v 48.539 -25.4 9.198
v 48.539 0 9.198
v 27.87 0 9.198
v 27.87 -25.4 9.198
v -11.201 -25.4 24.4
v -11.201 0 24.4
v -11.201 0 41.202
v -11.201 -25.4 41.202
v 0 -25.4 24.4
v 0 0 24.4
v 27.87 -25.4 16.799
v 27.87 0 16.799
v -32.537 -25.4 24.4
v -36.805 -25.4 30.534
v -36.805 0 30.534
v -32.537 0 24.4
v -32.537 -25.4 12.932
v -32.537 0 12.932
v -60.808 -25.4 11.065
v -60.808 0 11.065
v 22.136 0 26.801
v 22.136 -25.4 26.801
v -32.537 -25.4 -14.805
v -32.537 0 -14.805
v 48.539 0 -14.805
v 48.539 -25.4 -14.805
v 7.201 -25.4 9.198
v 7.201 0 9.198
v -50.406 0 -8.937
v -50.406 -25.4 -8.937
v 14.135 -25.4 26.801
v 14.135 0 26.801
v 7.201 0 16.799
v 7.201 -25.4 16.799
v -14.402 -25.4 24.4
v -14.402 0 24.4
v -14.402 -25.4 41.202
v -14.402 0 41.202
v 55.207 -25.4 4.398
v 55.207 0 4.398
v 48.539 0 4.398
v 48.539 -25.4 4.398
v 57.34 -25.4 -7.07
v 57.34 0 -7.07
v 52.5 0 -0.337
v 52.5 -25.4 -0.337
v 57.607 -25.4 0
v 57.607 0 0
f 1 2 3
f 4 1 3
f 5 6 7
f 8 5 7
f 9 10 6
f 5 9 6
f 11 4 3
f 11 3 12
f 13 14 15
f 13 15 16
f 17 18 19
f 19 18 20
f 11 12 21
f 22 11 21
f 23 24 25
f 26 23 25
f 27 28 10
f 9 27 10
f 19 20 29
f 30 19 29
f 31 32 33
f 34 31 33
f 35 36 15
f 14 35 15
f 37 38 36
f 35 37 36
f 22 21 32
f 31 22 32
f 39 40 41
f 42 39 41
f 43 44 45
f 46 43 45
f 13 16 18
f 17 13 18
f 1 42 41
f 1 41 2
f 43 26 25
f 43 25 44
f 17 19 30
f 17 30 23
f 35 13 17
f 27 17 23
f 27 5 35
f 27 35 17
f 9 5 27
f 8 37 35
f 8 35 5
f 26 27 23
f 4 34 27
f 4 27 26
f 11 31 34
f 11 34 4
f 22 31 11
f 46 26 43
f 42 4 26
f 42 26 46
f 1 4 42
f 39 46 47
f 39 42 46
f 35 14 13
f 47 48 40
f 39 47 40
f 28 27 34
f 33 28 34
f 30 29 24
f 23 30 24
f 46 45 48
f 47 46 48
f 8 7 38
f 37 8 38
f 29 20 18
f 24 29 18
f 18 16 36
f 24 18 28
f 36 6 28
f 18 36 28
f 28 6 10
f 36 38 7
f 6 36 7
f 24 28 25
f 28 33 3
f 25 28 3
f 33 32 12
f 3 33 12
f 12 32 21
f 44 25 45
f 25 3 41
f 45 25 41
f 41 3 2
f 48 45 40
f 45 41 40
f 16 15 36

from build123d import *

# Parameters (mm, degrees)
F0_W     = 20.66925
F0_H     = 7.60095
F1_DEPTH = 25.4


with BuildPart() as f1:
    # F0 (on Front) → F1 (new body)
    with BuildSketch(Plane.XZ):
        Polygon((-32.537401, 12.932173), (-60.807601, 11.065273), (-50.4063, -8.937228), (-32.537401, -14.804627), (17.0688, -14.804627), (48.5394, -14.804627), (48.5394, 4.397773), (48.5394, 9.198373), (27.87015, 9.198373), (7.2009, 9.198373), (0, 24.400273), (-11.2014, 24.400273), (-11.2014, 41.202374), (-14.4018, 41.202374), (-14.4018, 24.400273), (-32.537401, 24.400273), align=None)
        Polygon((-36.804602, 30.534372), (-32.537401, 24.400273), (-14.4018, 24.400273), align=None)
        Polygon((48.5394, 4.397773), (48.5394, -14.804627), (57.340499, -7.070328), (52.500348, -0.337245), (57.6072, 0), (55.206902, 4.397773), align=None)
        with Locations((17.535525, 12.998848)):
            Rectangle(F0_W, F0_H)
        Polygon((7.2009, 16.799323), (27.87015, 16.799323), (22.136101, 26.800573), (14.135102, 26.800573), align=None)
    extrude(amount=F1_DEPTH)


solid = f1.part
